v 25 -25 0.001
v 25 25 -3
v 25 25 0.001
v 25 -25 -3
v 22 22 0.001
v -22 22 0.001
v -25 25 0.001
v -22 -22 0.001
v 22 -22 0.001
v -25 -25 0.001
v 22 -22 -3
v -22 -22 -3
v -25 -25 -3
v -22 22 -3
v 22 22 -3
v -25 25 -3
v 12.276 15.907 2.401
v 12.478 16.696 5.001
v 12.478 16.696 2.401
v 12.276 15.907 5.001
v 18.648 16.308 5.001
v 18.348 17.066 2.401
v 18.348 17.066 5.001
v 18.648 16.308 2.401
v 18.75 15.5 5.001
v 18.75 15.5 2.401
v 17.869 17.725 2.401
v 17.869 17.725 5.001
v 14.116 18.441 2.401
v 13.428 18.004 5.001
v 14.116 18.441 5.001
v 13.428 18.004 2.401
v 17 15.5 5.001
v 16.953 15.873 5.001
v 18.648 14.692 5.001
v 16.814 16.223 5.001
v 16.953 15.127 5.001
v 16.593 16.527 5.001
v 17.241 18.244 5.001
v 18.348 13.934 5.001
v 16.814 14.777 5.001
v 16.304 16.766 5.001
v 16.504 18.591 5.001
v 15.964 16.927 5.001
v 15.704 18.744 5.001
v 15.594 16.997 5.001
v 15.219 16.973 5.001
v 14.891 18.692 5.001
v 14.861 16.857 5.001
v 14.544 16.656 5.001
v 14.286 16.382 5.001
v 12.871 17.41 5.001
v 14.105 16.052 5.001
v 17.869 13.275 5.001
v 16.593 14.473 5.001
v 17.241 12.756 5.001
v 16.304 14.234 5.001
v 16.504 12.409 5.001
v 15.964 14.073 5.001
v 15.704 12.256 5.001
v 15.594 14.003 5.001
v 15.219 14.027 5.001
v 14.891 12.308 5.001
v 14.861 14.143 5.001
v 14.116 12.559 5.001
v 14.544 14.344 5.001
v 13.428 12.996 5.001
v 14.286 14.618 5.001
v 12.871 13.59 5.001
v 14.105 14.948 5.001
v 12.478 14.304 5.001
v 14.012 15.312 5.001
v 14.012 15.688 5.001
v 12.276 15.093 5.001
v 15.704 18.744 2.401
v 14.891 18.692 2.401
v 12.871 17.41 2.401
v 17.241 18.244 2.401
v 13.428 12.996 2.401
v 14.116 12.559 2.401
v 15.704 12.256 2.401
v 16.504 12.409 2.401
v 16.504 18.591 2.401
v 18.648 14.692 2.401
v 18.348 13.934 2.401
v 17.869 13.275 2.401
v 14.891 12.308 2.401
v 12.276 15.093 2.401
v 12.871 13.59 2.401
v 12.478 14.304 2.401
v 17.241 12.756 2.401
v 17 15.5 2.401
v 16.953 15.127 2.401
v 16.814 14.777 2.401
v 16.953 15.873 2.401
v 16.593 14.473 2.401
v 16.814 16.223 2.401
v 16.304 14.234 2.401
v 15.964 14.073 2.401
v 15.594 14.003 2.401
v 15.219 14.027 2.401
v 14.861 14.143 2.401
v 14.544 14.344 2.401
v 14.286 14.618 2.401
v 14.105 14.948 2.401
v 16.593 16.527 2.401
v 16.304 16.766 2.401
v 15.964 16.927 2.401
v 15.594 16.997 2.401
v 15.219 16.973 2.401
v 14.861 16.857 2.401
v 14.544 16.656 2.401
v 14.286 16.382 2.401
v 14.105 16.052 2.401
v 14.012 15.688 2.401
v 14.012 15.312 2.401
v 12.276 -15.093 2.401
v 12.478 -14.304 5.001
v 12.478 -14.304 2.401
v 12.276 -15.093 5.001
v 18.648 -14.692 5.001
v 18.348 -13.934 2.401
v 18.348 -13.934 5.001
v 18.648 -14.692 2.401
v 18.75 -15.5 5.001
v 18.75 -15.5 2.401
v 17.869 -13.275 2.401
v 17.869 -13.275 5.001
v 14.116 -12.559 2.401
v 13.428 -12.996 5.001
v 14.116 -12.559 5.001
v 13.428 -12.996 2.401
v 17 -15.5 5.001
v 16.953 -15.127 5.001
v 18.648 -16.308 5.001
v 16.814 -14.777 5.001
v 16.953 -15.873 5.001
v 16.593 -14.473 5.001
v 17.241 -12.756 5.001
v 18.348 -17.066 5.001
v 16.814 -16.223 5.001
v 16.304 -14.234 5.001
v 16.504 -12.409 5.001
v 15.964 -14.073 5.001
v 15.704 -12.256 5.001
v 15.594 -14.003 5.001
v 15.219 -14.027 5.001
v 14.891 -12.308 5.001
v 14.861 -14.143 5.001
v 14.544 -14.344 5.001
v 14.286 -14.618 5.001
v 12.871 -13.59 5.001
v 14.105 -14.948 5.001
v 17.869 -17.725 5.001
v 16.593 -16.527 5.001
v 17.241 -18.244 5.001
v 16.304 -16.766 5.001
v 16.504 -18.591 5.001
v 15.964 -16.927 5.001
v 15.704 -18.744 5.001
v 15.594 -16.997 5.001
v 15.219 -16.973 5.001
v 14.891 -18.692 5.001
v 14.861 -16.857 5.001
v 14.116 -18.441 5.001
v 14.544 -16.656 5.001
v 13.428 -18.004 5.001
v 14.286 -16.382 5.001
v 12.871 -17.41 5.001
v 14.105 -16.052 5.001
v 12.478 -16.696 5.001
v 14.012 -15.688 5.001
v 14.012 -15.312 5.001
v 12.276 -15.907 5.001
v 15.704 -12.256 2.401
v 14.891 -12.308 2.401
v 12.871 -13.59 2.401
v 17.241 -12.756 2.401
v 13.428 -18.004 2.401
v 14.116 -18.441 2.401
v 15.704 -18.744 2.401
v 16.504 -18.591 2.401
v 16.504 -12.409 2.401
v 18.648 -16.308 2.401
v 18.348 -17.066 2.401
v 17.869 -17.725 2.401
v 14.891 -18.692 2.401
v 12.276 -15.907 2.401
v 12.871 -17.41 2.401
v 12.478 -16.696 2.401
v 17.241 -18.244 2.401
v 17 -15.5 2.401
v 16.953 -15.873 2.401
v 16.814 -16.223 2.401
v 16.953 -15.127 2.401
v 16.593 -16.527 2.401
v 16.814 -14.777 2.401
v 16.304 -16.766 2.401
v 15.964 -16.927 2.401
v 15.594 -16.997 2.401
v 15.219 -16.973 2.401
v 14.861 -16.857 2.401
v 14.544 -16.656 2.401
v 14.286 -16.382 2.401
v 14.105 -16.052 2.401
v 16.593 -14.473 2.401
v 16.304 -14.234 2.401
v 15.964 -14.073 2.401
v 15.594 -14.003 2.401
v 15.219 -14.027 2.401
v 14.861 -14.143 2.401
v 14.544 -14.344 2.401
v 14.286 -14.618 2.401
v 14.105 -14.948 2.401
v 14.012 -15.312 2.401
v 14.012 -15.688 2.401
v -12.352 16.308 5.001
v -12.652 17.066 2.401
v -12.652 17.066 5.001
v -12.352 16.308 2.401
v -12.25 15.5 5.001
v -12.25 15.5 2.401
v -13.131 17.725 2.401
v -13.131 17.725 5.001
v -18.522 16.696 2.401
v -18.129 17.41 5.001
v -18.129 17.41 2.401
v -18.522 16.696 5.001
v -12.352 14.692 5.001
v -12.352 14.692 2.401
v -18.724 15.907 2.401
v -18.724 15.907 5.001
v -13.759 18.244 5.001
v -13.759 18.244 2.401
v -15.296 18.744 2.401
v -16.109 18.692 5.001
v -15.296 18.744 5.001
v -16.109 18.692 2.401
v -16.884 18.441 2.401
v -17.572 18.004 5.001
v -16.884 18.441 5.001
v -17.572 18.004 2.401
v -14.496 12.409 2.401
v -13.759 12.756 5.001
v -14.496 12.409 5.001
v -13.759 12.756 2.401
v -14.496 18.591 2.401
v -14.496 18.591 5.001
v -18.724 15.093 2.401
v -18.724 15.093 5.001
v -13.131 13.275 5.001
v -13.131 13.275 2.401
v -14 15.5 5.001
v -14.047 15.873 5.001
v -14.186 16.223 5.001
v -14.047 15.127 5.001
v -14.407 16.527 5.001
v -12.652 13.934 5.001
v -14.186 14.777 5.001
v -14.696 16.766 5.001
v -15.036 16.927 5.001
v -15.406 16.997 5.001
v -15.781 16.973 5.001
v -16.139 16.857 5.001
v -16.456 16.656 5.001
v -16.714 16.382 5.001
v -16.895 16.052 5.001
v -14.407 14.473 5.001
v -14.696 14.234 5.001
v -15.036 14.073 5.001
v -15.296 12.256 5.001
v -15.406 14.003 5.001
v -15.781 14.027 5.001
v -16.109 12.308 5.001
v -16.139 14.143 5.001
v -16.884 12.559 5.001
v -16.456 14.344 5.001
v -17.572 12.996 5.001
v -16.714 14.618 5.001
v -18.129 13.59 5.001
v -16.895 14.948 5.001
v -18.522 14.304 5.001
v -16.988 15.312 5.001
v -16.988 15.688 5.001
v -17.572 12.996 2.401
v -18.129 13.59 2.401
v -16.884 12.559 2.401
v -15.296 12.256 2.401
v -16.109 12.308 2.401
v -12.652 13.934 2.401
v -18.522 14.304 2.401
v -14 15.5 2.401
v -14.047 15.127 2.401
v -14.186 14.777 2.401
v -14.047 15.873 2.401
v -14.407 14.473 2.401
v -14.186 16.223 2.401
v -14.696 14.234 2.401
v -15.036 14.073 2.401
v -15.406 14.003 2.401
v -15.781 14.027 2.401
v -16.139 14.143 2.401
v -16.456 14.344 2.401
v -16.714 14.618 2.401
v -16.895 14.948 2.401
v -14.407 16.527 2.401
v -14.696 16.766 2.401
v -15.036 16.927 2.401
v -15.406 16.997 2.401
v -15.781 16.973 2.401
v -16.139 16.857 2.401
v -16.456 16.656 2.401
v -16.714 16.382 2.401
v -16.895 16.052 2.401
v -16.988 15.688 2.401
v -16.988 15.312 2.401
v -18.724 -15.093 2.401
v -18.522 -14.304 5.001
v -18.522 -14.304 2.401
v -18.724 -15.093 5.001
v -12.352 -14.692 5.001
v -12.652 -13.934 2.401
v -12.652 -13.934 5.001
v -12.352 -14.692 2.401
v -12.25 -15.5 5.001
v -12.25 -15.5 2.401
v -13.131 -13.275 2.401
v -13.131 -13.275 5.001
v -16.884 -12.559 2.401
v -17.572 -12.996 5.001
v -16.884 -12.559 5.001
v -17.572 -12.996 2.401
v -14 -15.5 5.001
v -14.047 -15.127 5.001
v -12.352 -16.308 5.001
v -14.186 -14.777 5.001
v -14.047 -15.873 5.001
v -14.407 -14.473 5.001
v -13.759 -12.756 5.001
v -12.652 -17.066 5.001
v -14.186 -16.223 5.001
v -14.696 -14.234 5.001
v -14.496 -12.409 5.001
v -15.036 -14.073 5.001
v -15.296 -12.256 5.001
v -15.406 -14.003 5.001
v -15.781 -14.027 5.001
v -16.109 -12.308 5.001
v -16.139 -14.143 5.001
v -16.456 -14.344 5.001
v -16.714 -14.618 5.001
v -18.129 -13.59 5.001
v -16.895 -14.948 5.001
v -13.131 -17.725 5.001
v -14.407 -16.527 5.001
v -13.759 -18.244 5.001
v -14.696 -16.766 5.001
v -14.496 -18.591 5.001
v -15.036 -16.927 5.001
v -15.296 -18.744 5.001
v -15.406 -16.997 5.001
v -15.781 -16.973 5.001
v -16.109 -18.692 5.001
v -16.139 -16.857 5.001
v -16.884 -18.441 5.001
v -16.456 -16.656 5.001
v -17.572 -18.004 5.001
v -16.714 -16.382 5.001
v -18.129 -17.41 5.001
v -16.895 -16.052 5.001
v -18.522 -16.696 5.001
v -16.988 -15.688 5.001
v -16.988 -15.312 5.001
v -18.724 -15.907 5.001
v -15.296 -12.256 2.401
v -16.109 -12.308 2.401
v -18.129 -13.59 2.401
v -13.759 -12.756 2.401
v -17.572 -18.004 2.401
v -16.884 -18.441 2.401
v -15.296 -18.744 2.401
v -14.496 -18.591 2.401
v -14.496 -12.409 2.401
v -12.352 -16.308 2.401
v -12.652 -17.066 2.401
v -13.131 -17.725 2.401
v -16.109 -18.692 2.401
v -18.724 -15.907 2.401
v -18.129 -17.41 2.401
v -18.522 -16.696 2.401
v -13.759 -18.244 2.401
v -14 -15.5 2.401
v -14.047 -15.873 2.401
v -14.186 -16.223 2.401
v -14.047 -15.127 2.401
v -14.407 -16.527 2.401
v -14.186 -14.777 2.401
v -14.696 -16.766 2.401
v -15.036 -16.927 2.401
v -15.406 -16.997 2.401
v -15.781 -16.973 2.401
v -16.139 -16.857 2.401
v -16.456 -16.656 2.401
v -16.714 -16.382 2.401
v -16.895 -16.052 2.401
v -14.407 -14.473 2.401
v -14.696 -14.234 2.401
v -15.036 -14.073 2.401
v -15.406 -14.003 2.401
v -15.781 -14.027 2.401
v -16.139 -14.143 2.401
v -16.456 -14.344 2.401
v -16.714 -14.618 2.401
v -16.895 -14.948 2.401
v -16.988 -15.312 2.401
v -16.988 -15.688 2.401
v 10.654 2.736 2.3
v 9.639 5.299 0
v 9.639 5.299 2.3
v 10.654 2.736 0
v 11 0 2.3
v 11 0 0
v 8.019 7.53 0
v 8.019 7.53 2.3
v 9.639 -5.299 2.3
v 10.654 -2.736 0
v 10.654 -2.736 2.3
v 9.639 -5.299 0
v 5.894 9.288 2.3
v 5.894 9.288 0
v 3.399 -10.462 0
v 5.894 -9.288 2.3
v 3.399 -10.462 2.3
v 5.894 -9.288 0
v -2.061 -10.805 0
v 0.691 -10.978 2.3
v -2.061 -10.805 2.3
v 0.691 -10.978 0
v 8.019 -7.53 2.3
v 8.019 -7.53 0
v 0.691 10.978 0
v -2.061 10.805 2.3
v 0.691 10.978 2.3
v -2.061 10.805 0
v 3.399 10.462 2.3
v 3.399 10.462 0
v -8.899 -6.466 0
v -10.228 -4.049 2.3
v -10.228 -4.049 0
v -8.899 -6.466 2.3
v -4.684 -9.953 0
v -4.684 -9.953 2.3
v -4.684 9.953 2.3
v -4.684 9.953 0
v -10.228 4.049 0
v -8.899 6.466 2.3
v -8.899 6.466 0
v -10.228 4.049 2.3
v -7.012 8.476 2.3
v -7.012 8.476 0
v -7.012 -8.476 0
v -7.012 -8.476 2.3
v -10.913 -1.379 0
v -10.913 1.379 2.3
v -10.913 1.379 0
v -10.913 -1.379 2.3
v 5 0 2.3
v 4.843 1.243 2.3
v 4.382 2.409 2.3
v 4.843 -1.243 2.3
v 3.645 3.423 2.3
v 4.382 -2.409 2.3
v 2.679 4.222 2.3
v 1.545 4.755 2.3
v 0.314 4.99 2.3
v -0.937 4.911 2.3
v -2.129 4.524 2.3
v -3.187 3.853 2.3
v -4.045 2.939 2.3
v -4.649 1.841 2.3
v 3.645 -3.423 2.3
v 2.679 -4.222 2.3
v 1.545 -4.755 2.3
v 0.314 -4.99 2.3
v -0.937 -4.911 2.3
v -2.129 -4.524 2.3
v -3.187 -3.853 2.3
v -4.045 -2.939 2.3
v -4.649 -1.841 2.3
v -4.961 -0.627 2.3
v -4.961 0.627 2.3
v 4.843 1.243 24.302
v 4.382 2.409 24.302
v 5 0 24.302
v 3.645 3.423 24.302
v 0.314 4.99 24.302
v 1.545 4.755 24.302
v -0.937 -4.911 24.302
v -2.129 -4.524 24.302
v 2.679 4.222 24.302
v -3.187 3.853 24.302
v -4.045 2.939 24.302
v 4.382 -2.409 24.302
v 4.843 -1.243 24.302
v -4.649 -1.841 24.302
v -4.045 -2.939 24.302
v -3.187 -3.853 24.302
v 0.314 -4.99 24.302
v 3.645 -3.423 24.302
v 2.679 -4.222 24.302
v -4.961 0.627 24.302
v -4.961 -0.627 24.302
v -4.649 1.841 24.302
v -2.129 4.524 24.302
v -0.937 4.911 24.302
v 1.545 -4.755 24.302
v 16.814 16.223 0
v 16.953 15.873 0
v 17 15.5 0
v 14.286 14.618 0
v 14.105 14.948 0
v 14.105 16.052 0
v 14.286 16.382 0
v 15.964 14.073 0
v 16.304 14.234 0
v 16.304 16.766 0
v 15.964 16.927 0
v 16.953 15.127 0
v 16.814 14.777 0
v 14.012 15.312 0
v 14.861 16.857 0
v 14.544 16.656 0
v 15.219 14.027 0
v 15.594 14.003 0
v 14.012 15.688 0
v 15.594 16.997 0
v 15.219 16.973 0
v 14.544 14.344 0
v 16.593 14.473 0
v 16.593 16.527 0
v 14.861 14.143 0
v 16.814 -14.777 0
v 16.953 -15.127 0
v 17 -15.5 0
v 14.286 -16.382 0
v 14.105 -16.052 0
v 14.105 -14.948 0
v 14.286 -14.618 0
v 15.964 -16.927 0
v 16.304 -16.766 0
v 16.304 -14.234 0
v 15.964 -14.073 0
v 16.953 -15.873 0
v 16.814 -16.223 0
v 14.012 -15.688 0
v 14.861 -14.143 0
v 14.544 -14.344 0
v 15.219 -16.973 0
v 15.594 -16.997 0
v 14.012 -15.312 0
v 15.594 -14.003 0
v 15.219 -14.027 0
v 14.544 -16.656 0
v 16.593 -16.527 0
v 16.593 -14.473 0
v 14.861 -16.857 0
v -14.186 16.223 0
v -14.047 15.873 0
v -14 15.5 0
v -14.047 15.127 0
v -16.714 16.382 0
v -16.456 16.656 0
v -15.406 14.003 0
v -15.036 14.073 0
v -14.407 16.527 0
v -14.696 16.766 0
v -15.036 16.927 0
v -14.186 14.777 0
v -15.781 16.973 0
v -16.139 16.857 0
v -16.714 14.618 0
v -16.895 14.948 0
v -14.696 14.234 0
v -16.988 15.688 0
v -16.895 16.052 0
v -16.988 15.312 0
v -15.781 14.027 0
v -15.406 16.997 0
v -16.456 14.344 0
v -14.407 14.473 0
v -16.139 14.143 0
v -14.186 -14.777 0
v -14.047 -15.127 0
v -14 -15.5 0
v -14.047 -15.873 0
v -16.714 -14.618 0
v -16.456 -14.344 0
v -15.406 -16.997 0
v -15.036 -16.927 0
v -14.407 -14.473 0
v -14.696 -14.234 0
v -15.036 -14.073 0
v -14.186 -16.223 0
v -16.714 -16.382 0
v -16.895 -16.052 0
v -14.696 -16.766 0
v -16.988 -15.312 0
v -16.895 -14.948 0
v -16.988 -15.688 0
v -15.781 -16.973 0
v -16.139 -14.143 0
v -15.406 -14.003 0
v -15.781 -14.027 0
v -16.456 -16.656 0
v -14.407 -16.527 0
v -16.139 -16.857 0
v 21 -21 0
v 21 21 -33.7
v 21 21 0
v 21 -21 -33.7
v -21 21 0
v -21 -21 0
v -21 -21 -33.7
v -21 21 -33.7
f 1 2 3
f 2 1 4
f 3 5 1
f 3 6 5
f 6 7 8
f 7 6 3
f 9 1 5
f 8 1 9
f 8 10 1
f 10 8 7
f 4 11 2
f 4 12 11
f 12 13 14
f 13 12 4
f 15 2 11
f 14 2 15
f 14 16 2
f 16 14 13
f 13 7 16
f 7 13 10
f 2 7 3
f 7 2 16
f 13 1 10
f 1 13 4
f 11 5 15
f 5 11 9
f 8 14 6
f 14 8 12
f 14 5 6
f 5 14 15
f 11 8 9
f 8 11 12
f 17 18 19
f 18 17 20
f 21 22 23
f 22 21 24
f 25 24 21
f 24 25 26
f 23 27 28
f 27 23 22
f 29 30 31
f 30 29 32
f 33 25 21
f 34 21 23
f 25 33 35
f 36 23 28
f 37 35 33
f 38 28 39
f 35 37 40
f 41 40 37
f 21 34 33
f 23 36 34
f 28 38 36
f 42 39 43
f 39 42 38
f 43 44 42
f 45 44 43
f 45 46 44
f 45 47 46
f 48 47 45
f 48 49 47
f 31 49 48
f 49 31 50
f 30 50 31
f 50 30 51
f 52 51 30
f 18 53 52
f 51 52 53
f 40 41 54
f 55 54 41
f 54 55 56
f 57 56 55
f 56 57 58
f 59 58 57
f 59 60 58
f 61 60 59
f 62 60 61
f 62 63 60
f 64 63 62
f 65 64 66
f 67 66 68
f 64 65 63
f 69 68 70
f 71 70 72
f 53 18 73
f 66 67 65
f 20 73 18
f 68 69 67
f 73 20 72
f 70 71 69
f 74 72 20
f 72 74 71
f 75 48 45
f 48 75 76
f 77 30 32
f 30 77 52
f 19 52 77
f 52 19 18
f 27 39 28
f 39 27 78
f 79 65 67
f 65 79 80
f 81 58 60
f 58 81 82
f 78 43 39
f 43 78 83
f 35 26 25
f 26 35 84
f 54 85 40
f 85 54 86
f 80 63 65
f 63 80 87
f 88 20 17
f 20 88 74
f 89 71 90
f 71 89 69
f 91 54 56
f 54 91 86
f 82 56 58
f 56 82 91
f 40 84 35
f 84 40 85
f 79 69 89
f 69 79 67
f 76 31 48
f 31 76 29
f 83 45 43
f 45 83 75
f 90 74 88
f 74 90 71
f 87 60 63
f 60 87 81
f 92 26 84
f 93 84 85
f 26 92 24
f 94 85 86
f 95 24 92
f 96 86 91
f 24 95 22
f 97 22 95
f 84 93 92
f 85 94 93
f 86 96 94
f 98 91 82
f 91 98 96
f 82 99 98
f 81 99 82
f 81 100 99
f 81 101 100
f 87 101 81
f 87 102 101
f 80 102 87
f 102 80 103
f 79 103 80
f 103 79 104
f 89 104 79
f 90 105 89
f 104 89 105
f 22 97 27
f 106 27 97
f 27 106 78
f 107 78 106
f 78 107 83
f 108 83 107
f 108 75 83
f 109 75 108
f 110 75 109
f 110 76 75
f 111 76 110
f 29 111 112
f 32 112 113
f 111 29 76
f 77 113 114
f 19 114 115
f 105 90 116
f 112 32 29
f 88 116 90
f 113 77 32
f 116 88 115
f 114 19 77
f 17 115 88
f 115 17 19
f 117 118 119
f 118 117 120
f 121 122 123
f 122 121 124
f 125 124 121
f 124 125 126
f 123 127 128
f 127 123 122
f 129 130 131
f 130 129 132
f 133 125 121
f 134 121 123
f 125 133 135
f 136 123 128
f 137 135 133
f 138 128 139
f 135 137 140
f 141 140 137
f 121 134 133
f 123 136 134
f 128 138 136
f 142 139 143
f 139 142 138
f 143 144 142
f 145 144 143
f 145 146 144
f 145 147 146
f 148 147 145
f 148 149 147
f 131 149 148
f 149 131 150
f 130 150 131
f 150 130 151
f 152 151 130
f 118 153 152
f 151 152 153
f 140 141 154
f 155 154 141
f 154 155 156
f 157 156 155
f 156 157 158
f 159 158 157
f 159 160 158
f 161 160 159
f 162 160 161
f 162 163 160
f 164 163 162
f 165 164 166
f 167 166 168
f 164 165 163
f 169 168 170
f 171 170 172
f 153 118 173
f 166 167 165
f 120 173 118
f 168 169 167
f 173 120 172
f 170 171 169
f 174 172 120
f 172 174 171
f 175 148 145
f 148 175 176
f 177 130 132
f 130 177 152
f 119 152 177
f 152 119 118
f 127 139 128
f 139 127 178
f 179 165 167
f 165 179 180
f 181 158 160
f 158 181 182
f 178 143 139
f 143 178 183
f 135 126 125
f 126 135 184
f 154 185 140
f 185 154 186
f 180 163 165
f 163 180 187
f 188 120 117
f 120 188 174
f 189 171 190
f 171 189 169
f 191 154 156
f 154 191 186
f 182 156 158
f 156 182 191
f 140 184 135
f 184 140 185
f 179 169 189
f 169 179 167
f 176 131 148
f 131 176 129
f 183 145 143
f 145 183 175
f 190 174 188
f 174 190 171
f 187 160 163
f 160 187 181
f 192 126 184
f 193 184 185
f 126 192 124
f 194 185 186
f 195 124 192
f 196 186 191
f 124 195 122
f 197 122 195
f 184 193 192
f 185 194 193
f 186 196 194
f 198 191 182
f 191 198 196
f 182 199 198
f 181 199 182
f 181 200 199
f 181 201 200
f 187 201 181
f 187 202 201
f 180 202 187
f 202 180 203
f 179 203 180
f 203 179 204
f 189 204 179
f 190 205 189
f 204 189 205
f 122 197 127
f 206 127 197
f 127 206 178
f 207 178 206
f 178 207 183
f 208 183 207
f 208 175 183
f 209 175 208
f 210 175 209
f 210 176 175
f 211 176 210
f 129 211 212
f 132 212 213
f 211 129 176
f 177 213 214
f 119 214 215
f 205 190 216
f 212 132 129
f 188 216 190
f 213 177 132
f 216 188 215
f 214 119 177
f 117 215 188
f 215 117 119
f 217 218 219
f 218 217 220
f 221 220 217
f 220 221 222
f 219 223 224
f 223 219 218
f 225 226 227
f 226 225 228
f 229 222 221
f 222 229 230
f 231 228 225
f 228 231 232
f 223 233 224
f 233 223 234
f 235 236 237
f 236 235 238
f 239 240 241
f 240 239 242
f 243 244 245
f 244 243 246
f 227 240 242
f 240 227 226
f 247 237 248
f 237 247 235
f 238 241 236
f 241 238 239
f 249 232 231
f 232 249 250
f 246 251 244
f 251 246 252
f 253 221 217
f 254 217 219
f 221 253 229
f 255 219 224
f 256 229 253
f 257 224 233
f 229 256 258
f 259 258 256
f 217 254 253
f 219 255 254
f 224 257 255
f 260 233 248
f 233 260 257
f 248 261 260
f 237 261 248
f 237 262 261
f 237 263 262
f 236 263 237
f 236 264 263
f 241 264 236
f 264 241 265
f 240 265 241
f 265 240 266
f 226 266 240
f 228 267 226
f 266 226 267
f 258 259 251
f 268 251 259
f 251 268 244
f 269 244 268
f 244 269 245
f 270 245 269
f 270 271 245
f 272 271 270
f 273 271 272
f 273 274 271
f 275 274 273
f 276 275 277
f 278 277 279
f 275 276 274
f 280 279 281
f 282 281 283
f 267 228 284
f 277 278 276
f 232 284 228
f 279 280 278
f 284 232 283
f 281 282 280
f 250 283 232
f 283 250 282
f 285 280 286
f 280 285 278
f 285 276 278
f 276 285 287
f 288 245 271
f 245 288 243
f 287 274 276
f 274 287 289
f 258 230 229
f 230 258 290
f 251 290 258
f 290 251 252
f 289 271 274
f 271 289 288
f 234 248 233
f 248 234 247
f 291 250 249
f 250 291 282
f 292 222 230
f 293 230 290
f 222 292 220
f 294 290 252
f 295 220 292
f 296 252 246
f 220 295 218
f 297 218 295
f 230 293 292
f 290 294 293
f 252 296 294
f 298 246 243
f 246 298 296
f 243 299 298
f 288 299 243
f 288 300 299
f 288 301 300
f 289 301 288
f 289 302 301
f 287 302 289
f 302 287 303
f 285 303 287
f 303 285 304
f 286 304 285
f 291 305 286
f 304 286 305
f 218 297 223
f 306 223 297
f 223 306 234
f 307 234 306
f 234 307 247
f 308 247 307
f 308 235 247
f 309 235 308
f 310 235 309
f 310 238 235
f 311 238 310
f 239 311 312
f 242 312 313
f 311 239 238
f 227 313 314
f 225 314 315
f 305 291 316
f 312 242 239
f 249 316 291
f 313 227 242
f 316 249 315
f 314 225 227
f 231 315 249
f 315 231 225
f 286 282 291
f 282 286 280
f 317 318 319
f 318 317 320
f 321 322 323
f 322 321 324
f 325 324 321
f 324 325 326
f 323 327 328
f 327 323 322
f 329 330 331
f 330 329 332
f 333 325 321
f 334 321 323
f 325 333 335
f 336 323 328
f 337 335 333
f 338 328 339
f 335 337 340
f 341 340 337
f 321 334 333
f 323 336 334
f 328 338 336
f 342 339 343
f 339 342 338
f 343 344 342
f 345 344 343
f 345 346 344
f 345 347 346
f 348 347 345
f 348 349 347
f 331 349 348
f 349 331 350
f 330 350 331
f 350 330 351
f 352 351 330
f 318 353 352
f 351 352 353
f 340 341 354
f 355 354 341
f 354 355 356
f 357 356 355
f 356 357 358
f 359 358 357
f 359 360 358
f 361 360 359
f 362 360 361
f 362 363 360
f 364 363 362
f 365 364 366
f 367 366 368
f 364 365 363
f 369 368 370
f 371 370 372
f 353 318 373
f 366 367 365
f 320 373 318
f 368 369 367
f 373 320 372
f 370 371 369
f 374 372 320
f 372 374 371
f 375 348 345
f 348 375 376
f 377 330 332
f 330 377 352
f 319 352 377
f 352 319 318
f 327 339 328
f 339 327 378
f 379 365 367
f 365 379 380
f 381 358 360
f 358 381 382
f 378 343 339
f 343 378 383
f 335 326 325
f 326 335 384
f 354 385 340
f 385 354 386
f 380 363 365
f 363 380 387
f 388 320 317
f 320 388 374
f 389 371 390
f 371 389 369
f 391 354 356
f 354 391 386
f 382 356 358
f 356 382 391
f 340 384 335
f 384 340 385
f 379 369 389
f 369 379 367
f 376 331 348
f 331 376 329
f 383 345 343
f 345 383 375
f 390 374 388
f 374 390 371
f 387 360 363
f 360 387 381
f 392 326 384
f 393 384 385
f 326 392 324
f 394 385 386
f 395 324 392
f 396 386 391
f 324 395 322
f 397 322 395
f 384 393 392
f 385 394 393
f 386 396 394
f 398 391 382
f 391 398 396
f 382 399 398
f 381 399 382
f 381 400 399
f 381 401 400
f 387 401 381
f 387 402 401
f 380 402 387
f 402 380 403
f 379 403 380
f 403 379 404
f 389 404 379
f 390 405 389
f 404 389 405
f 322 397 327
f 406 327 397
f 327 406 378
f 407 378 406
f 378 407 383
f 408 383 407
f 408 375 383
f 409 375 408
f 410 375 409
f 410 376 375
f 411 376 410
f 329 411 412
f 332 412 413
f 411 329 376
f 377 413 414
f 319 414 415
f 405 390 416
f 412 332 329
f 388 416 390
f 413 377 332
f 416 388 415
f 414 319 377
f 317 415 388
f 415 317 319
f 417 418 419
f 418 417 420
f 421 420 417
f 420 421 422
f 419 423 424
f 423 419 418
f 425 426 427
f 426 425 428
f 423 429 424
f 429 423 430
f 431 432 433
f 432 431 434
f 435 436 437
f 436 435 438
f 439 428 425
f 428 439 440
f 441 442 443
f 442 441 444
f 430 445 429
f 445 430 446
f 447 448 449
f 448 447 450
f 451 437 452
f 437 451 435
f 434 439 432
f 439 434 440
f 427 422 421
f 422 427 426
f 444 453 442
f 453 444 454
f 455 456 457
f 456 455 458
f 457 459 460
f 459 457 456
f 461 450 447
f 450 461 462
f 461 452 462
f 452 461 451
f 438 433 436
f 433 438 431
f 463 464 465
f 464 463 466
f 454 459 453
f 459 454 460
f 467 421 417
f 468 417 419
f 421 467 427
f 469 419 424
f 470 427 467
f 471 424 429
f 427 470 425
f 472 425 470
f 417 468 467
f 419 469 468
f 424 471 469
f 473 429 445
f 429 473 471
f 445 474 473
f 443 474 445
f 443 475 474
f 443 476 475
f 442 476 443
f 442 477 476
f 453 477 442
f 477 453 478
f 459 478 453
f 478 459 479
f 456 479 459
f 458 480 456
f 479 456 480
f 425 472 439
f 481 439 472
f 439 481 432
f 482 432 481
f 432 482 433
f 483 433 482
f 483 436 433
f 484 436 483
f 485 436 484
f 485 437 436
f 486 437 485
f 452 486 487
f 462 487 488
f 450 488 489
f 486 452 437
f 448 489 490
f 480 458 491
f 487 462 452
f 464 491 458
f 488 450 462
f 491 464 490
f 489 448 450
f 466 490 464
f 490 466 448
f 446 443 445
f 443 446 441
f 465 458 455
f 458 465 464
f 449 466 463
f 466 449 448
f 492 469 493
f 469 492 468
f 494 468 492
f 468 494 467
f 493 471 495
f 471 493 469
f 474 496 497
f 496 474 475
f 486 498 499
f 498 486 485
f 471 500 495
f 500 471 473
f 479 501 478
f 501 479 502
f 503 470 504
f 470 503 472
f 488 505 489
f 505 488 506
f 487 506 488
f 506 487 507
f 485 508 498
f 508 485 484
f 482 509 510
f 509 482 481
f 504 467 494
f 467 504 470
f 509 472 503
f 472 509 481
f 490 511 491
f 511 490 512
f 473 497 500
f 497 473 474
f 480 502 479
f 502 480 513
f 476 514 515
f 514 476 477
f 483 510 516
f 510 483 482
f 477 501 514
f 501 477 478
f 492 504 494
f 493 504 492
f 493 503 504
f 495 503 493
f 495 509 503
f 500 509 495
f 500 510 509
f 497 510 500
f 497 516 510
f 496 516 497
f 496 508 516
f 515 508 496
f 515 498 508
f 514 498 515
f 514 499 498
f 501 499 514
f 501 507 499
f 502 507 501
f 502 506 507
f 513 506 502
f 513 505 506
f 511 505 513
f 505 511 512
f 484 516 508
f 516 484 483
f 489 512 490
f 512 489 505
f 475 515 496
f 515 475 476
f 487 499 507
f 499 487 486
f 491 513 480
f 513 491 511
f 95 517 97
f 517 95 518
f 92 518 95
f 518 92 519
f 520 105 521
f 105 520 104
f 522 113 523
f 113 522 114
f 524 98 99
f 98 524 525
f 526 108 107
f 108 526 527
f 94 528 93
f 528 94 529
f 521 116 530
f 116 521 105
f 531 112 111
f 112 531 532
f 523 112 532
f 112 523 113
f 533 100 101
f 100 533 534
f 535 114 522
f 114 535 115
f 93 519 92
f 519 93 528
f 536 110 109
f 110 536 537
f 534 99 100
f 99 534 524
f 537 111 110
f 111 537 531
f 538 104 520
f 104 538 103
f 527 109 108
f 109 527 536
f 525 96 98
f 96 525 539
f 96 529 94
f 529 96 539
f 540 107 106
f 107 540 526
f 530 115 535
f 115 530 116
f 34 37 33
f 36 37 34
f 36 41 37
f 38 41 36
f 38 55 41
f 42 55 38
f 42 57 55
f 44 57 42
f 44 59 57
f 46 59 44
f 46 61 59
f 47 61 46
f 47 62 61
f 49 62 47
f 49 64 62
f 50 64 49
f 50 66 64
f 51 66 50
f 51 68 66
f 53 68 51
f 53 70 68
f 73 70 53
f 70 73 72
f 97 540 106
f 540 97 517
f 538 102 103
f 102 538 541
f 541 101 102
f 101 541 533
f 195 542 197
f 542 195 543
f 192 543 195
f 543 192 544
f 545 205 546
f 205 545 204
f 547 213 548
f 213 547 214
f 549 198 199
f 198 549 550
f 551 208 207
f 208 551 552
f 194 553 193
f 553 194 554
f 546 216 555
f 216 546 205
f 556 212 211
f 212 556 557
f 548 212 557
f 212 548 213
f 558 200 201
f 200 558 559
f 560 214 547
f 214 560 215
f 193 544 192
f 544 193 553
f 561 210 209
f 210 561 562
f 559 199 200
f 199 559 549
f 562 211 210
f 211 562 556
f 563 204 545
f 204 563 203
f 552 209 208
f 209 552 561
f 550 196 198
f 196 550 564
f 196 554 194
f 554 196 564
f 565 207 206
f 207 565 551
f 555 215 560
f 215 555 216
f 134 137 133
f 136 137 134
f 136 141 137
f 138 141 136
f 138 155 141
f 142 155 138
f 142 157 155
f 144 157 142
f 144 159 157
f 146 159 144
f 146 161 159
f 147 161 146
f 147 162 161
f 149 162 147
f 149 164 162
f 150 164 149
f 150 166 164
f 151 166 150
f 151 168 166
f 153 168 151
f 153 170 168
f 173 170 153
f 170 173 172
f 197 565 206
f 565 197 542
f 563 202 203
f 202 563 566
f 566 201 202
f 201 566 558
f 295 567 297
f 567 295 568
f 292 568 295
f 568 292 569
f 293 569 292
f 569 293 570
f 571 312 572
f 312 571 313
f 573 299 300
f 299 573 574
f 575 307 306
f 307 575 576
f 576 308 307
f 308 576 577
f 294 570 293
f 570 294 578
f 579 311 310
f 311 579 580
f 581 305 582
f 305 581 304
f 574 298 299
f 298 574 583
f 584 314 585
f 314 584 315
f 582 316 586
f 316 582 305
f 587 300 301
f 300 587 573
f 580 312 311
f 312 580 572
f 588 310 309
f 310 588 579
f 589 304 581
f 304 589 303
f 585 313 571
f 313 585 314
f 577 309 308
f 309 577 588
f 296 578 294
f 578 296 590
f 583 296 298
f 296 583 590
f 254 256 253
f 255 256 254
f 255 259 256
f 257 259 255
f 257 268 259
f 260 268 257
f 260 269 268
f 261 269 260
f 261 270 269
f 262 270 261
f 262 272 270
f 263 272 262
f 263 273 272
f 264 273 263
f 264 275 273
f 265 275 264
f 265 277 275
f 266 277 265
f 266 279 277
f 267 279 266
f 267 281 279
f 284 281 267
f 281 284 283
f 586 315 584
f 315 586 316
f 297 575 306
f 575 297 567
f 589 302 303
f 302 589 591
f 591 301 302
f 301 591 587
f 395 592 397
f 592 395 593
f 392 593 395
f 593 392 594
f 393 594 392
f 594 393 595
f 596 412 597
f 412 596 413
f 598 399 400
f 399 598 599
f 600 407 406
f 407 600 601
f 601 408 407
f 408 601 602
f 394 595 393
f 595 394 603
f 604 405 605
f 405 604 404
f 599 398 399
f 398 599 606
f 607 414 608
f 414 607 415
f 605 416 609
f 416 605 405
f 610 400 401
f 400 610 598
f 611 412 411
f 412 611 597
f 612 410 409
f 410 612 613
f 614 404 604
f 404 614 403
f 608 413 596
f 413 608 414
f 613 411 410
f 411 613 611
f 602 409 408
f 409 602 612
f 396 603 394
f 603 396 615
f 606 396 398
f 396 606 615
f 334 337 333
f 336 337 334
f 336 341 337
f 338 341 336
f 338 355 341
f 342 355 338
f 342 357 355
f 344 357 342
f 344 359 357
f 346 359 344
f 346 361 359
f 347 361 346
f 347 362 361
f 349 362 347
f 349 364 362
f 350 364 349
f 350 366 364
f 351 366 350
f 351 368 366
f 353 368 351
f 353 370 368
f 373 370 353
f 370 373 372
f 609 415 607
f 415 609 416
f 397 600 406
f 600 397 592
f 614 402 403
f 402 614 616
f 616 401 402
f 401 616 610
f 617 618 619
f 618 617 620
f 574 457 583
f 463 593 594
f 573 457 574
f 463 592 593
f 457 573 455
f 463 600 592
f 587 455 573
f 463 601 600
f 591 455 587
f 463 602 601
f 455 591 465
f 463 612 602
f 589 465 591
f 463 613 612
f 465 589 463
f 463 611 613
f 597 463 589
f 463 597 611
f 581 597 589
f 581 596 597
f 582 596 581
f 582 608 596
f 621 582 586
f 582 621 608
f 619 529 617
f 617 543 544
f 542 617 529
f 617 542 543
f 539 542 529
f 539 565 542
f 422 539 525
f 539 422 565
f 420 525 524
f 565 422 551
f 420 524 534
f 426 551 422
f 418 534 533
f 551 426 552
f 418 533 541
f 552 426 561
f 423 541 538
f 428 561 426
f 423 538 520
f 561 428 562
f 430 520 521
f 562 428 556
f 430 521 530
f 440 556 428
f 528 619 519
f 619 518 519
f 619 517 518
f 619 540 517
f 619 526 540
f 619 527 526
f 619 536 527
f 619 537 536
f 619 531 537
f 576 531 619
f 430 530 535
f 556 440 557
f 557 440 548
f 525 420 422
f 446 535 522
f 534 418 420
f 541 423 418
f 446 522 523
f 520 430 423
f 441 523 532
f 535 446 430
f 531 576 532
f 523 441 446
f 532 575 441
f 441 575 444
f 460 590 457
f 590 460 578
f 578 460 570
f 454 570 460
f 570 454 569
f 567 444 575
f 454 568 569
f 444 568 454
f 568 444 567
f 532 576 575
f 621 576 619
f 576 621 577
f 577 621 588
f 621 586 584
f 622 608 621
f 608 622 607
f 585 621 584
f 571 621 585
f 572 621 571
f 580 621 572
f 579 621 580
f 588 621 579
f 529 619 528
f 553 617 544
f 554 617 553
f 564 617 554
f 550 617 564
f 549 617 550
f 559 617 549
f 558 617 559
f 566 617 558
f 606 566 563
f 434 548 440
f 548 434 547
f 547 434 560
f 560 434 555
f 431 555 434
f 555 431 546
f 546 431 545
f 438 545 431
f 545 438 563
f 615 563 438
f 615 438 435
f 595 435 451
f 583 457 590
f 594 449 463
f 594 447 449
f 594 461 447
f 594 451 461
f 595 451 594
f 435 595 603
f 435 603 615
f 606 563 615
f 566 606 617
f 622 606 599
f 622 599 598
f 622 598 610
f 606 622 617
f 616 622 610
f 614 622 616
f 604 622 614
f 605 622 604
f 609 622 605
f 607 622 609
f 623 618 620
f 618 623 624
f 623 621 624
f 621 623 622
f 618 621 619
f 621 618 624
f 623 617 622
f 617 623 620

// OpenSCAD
// file: params.scad
// Gear mechanical properties
gear_module = 2.0;
gear_width = 8.0;
gear_pressure_angle = 20.0;
gear_helix_angle=35.0;

// Dual gear defining properties
gear_teeth_1 = 30;
gear_teeth_2 = 8;
gear_2_extra_height = 2.0;

// Shaft properties
gear_shaft_hole_diameter=5.0;

// Motor properties
motor_linear_side_length=42.00;
motor_shaft_diameter=5.0;
motor_shaft_length=22.00;
motor_body_height=33.70;
motor_screw_pattern_side_length=31.0;
motor_screw_holes_diameter=3.0;

// Motor mounting properties
motor_locator_walls_side_clearance=2.00;
motor_locator_walls_thickness=3.00;
motor_locator_walls_depth=3.00;
motor_centre_circle_diameter=22.0;
motor_centre_circle_depth=2.30;
motor_shaft_clearance_diameter=10.0;
motor_screw_hole_extra_clearance=0.50;
motor_screw_holes_cap_diameter=6.50;
motor_screw_holes_cap_depth=2.60;











// Model-forming properties
$fn = 25;
eps=0.001;  // Very small number, to ensure non-zero overlaps.
// main file
include <params.scad>

module motor_mockup() {
    
    translate([0.0, 0.0, -motor_body_height/2])
        cube([motor_linear_side_length, motor_linear_side_length, motor_body_height], center=true);
    
    // Locator ring
    translate([0.0, 0.0, -eps])
        cylinder(d=motor_centre_circle_diameter, h=motor_centre_circle_depth+eps);
    
    // Shaft
    translate([0.0, 0.0, motor_centre_circle_depth-eps])
        cylinder(d=motor_shaft_diameter, h=motor_shaft_length+eps);
    
};

module motor_locator_positive() {
    // Walls    
    difference() {
        translate([0.0, 0.0, -motor_locator_walls_depth/2 + eps/2])
            cube([motor_linear_side_length + motor_locator_walls_side_clearance + 2*motor_locator_walls_thickness, motor_linear_side_length + motor_locator_walls_side_clearance + 2*motor_locator_walls_thickness, motor_locator_walls_depth + eps], center=true);
        
        translate([0.0, 0.0, -motor_locator_walls_depth/2 + eps/2])
            cube([motor_linear_side_length + motor_locator_walls_side_clearance, motor_linear_side_length + motor_locator_walls_side_clearance, motor_locator_walls_depth + 2*eps], center=true);
    };
}

module motor_locator_negative(plate_thickness) {
    // Locator hole for motor
    translate([0.0, 0.0, -eps])
        cylinder(d=motor_centre_circle_diameter, h=motor_centre_circle_depth+eps);
    
    // Hole for motor shaft
    translate([0.0, 0.0, 0.0])
        cylinder(d=motor_shaft_clearance_diameter, h=motor_shaft_length + motor_centre_circle_depth + 2*eps);
    
            // Screw holes for motor
            translate([motor_screw_pattern_side_length/2, motor_screw_pattern_side_length/2, -eps])
                cylinder(d=motor_screw_holes_diameter, h=plate_thickness + 2*eps);
            translate([motor_screw_pattern_side_length/2, -motor_screw_pattern_side_length/2, -eps])
                cylinder(d=motor_screw_holes_diameter, h=plate_thickness + 2*eps);
            translate([-motor_screw_pattern_side_length/2, motor_screw_pattern_side_length/2, -eps])
                cylinder(d=motor_screw_holes_diameter, h=plate_thickness + 2*eps);
            translate([-motor_screw_pattern_side_length/2, -motor_screw_pattern_side_length/2, -eps])
                cylinder(d=motor_screw_holes_diameter, h=plate_thickness + 2*eps);
    
            // Recesses for screw cap heads
            translate([0.0, 0.0, plate_thickness - motor_screw_holes_cap_depth + eps]) {
                translate([motor_screw_pattern_side_length/2, motor_screw_pattern_side_length/2])
                    cylinder(d=motor_screw_holes_cap_diameter, h=motor_screw_holes_cap_depth);
                translate([motor_screw_pattern_side_length/2, -motor_screw_pattern_side_length/2])
                    cylinder(d=motor_screw_holes_cap_diameter, h=motor_screw_holes_cap_depth);
                translate([-motor_screw_pattern_side_length/2, motor_screw_pattern_side_length/2])
                    cylinder(d=motor_screw_holes_cap_diameter, h=motor_screw_holes_cap_depth);
                translate([-motor_screw_pattern_side_length/2, -motor_screw_pattern_side_length/2])
                    cylinder(d=motor_screw_holes_cap_diameter, h=motor_screw_holes_cap_depth);
            };
}

motor_locator_positive();

color("red", alpha=0.8)
motor_locator_negative(plate_thickness=5.0);

color("gray", alpha=0.5)
motor_mockup();
